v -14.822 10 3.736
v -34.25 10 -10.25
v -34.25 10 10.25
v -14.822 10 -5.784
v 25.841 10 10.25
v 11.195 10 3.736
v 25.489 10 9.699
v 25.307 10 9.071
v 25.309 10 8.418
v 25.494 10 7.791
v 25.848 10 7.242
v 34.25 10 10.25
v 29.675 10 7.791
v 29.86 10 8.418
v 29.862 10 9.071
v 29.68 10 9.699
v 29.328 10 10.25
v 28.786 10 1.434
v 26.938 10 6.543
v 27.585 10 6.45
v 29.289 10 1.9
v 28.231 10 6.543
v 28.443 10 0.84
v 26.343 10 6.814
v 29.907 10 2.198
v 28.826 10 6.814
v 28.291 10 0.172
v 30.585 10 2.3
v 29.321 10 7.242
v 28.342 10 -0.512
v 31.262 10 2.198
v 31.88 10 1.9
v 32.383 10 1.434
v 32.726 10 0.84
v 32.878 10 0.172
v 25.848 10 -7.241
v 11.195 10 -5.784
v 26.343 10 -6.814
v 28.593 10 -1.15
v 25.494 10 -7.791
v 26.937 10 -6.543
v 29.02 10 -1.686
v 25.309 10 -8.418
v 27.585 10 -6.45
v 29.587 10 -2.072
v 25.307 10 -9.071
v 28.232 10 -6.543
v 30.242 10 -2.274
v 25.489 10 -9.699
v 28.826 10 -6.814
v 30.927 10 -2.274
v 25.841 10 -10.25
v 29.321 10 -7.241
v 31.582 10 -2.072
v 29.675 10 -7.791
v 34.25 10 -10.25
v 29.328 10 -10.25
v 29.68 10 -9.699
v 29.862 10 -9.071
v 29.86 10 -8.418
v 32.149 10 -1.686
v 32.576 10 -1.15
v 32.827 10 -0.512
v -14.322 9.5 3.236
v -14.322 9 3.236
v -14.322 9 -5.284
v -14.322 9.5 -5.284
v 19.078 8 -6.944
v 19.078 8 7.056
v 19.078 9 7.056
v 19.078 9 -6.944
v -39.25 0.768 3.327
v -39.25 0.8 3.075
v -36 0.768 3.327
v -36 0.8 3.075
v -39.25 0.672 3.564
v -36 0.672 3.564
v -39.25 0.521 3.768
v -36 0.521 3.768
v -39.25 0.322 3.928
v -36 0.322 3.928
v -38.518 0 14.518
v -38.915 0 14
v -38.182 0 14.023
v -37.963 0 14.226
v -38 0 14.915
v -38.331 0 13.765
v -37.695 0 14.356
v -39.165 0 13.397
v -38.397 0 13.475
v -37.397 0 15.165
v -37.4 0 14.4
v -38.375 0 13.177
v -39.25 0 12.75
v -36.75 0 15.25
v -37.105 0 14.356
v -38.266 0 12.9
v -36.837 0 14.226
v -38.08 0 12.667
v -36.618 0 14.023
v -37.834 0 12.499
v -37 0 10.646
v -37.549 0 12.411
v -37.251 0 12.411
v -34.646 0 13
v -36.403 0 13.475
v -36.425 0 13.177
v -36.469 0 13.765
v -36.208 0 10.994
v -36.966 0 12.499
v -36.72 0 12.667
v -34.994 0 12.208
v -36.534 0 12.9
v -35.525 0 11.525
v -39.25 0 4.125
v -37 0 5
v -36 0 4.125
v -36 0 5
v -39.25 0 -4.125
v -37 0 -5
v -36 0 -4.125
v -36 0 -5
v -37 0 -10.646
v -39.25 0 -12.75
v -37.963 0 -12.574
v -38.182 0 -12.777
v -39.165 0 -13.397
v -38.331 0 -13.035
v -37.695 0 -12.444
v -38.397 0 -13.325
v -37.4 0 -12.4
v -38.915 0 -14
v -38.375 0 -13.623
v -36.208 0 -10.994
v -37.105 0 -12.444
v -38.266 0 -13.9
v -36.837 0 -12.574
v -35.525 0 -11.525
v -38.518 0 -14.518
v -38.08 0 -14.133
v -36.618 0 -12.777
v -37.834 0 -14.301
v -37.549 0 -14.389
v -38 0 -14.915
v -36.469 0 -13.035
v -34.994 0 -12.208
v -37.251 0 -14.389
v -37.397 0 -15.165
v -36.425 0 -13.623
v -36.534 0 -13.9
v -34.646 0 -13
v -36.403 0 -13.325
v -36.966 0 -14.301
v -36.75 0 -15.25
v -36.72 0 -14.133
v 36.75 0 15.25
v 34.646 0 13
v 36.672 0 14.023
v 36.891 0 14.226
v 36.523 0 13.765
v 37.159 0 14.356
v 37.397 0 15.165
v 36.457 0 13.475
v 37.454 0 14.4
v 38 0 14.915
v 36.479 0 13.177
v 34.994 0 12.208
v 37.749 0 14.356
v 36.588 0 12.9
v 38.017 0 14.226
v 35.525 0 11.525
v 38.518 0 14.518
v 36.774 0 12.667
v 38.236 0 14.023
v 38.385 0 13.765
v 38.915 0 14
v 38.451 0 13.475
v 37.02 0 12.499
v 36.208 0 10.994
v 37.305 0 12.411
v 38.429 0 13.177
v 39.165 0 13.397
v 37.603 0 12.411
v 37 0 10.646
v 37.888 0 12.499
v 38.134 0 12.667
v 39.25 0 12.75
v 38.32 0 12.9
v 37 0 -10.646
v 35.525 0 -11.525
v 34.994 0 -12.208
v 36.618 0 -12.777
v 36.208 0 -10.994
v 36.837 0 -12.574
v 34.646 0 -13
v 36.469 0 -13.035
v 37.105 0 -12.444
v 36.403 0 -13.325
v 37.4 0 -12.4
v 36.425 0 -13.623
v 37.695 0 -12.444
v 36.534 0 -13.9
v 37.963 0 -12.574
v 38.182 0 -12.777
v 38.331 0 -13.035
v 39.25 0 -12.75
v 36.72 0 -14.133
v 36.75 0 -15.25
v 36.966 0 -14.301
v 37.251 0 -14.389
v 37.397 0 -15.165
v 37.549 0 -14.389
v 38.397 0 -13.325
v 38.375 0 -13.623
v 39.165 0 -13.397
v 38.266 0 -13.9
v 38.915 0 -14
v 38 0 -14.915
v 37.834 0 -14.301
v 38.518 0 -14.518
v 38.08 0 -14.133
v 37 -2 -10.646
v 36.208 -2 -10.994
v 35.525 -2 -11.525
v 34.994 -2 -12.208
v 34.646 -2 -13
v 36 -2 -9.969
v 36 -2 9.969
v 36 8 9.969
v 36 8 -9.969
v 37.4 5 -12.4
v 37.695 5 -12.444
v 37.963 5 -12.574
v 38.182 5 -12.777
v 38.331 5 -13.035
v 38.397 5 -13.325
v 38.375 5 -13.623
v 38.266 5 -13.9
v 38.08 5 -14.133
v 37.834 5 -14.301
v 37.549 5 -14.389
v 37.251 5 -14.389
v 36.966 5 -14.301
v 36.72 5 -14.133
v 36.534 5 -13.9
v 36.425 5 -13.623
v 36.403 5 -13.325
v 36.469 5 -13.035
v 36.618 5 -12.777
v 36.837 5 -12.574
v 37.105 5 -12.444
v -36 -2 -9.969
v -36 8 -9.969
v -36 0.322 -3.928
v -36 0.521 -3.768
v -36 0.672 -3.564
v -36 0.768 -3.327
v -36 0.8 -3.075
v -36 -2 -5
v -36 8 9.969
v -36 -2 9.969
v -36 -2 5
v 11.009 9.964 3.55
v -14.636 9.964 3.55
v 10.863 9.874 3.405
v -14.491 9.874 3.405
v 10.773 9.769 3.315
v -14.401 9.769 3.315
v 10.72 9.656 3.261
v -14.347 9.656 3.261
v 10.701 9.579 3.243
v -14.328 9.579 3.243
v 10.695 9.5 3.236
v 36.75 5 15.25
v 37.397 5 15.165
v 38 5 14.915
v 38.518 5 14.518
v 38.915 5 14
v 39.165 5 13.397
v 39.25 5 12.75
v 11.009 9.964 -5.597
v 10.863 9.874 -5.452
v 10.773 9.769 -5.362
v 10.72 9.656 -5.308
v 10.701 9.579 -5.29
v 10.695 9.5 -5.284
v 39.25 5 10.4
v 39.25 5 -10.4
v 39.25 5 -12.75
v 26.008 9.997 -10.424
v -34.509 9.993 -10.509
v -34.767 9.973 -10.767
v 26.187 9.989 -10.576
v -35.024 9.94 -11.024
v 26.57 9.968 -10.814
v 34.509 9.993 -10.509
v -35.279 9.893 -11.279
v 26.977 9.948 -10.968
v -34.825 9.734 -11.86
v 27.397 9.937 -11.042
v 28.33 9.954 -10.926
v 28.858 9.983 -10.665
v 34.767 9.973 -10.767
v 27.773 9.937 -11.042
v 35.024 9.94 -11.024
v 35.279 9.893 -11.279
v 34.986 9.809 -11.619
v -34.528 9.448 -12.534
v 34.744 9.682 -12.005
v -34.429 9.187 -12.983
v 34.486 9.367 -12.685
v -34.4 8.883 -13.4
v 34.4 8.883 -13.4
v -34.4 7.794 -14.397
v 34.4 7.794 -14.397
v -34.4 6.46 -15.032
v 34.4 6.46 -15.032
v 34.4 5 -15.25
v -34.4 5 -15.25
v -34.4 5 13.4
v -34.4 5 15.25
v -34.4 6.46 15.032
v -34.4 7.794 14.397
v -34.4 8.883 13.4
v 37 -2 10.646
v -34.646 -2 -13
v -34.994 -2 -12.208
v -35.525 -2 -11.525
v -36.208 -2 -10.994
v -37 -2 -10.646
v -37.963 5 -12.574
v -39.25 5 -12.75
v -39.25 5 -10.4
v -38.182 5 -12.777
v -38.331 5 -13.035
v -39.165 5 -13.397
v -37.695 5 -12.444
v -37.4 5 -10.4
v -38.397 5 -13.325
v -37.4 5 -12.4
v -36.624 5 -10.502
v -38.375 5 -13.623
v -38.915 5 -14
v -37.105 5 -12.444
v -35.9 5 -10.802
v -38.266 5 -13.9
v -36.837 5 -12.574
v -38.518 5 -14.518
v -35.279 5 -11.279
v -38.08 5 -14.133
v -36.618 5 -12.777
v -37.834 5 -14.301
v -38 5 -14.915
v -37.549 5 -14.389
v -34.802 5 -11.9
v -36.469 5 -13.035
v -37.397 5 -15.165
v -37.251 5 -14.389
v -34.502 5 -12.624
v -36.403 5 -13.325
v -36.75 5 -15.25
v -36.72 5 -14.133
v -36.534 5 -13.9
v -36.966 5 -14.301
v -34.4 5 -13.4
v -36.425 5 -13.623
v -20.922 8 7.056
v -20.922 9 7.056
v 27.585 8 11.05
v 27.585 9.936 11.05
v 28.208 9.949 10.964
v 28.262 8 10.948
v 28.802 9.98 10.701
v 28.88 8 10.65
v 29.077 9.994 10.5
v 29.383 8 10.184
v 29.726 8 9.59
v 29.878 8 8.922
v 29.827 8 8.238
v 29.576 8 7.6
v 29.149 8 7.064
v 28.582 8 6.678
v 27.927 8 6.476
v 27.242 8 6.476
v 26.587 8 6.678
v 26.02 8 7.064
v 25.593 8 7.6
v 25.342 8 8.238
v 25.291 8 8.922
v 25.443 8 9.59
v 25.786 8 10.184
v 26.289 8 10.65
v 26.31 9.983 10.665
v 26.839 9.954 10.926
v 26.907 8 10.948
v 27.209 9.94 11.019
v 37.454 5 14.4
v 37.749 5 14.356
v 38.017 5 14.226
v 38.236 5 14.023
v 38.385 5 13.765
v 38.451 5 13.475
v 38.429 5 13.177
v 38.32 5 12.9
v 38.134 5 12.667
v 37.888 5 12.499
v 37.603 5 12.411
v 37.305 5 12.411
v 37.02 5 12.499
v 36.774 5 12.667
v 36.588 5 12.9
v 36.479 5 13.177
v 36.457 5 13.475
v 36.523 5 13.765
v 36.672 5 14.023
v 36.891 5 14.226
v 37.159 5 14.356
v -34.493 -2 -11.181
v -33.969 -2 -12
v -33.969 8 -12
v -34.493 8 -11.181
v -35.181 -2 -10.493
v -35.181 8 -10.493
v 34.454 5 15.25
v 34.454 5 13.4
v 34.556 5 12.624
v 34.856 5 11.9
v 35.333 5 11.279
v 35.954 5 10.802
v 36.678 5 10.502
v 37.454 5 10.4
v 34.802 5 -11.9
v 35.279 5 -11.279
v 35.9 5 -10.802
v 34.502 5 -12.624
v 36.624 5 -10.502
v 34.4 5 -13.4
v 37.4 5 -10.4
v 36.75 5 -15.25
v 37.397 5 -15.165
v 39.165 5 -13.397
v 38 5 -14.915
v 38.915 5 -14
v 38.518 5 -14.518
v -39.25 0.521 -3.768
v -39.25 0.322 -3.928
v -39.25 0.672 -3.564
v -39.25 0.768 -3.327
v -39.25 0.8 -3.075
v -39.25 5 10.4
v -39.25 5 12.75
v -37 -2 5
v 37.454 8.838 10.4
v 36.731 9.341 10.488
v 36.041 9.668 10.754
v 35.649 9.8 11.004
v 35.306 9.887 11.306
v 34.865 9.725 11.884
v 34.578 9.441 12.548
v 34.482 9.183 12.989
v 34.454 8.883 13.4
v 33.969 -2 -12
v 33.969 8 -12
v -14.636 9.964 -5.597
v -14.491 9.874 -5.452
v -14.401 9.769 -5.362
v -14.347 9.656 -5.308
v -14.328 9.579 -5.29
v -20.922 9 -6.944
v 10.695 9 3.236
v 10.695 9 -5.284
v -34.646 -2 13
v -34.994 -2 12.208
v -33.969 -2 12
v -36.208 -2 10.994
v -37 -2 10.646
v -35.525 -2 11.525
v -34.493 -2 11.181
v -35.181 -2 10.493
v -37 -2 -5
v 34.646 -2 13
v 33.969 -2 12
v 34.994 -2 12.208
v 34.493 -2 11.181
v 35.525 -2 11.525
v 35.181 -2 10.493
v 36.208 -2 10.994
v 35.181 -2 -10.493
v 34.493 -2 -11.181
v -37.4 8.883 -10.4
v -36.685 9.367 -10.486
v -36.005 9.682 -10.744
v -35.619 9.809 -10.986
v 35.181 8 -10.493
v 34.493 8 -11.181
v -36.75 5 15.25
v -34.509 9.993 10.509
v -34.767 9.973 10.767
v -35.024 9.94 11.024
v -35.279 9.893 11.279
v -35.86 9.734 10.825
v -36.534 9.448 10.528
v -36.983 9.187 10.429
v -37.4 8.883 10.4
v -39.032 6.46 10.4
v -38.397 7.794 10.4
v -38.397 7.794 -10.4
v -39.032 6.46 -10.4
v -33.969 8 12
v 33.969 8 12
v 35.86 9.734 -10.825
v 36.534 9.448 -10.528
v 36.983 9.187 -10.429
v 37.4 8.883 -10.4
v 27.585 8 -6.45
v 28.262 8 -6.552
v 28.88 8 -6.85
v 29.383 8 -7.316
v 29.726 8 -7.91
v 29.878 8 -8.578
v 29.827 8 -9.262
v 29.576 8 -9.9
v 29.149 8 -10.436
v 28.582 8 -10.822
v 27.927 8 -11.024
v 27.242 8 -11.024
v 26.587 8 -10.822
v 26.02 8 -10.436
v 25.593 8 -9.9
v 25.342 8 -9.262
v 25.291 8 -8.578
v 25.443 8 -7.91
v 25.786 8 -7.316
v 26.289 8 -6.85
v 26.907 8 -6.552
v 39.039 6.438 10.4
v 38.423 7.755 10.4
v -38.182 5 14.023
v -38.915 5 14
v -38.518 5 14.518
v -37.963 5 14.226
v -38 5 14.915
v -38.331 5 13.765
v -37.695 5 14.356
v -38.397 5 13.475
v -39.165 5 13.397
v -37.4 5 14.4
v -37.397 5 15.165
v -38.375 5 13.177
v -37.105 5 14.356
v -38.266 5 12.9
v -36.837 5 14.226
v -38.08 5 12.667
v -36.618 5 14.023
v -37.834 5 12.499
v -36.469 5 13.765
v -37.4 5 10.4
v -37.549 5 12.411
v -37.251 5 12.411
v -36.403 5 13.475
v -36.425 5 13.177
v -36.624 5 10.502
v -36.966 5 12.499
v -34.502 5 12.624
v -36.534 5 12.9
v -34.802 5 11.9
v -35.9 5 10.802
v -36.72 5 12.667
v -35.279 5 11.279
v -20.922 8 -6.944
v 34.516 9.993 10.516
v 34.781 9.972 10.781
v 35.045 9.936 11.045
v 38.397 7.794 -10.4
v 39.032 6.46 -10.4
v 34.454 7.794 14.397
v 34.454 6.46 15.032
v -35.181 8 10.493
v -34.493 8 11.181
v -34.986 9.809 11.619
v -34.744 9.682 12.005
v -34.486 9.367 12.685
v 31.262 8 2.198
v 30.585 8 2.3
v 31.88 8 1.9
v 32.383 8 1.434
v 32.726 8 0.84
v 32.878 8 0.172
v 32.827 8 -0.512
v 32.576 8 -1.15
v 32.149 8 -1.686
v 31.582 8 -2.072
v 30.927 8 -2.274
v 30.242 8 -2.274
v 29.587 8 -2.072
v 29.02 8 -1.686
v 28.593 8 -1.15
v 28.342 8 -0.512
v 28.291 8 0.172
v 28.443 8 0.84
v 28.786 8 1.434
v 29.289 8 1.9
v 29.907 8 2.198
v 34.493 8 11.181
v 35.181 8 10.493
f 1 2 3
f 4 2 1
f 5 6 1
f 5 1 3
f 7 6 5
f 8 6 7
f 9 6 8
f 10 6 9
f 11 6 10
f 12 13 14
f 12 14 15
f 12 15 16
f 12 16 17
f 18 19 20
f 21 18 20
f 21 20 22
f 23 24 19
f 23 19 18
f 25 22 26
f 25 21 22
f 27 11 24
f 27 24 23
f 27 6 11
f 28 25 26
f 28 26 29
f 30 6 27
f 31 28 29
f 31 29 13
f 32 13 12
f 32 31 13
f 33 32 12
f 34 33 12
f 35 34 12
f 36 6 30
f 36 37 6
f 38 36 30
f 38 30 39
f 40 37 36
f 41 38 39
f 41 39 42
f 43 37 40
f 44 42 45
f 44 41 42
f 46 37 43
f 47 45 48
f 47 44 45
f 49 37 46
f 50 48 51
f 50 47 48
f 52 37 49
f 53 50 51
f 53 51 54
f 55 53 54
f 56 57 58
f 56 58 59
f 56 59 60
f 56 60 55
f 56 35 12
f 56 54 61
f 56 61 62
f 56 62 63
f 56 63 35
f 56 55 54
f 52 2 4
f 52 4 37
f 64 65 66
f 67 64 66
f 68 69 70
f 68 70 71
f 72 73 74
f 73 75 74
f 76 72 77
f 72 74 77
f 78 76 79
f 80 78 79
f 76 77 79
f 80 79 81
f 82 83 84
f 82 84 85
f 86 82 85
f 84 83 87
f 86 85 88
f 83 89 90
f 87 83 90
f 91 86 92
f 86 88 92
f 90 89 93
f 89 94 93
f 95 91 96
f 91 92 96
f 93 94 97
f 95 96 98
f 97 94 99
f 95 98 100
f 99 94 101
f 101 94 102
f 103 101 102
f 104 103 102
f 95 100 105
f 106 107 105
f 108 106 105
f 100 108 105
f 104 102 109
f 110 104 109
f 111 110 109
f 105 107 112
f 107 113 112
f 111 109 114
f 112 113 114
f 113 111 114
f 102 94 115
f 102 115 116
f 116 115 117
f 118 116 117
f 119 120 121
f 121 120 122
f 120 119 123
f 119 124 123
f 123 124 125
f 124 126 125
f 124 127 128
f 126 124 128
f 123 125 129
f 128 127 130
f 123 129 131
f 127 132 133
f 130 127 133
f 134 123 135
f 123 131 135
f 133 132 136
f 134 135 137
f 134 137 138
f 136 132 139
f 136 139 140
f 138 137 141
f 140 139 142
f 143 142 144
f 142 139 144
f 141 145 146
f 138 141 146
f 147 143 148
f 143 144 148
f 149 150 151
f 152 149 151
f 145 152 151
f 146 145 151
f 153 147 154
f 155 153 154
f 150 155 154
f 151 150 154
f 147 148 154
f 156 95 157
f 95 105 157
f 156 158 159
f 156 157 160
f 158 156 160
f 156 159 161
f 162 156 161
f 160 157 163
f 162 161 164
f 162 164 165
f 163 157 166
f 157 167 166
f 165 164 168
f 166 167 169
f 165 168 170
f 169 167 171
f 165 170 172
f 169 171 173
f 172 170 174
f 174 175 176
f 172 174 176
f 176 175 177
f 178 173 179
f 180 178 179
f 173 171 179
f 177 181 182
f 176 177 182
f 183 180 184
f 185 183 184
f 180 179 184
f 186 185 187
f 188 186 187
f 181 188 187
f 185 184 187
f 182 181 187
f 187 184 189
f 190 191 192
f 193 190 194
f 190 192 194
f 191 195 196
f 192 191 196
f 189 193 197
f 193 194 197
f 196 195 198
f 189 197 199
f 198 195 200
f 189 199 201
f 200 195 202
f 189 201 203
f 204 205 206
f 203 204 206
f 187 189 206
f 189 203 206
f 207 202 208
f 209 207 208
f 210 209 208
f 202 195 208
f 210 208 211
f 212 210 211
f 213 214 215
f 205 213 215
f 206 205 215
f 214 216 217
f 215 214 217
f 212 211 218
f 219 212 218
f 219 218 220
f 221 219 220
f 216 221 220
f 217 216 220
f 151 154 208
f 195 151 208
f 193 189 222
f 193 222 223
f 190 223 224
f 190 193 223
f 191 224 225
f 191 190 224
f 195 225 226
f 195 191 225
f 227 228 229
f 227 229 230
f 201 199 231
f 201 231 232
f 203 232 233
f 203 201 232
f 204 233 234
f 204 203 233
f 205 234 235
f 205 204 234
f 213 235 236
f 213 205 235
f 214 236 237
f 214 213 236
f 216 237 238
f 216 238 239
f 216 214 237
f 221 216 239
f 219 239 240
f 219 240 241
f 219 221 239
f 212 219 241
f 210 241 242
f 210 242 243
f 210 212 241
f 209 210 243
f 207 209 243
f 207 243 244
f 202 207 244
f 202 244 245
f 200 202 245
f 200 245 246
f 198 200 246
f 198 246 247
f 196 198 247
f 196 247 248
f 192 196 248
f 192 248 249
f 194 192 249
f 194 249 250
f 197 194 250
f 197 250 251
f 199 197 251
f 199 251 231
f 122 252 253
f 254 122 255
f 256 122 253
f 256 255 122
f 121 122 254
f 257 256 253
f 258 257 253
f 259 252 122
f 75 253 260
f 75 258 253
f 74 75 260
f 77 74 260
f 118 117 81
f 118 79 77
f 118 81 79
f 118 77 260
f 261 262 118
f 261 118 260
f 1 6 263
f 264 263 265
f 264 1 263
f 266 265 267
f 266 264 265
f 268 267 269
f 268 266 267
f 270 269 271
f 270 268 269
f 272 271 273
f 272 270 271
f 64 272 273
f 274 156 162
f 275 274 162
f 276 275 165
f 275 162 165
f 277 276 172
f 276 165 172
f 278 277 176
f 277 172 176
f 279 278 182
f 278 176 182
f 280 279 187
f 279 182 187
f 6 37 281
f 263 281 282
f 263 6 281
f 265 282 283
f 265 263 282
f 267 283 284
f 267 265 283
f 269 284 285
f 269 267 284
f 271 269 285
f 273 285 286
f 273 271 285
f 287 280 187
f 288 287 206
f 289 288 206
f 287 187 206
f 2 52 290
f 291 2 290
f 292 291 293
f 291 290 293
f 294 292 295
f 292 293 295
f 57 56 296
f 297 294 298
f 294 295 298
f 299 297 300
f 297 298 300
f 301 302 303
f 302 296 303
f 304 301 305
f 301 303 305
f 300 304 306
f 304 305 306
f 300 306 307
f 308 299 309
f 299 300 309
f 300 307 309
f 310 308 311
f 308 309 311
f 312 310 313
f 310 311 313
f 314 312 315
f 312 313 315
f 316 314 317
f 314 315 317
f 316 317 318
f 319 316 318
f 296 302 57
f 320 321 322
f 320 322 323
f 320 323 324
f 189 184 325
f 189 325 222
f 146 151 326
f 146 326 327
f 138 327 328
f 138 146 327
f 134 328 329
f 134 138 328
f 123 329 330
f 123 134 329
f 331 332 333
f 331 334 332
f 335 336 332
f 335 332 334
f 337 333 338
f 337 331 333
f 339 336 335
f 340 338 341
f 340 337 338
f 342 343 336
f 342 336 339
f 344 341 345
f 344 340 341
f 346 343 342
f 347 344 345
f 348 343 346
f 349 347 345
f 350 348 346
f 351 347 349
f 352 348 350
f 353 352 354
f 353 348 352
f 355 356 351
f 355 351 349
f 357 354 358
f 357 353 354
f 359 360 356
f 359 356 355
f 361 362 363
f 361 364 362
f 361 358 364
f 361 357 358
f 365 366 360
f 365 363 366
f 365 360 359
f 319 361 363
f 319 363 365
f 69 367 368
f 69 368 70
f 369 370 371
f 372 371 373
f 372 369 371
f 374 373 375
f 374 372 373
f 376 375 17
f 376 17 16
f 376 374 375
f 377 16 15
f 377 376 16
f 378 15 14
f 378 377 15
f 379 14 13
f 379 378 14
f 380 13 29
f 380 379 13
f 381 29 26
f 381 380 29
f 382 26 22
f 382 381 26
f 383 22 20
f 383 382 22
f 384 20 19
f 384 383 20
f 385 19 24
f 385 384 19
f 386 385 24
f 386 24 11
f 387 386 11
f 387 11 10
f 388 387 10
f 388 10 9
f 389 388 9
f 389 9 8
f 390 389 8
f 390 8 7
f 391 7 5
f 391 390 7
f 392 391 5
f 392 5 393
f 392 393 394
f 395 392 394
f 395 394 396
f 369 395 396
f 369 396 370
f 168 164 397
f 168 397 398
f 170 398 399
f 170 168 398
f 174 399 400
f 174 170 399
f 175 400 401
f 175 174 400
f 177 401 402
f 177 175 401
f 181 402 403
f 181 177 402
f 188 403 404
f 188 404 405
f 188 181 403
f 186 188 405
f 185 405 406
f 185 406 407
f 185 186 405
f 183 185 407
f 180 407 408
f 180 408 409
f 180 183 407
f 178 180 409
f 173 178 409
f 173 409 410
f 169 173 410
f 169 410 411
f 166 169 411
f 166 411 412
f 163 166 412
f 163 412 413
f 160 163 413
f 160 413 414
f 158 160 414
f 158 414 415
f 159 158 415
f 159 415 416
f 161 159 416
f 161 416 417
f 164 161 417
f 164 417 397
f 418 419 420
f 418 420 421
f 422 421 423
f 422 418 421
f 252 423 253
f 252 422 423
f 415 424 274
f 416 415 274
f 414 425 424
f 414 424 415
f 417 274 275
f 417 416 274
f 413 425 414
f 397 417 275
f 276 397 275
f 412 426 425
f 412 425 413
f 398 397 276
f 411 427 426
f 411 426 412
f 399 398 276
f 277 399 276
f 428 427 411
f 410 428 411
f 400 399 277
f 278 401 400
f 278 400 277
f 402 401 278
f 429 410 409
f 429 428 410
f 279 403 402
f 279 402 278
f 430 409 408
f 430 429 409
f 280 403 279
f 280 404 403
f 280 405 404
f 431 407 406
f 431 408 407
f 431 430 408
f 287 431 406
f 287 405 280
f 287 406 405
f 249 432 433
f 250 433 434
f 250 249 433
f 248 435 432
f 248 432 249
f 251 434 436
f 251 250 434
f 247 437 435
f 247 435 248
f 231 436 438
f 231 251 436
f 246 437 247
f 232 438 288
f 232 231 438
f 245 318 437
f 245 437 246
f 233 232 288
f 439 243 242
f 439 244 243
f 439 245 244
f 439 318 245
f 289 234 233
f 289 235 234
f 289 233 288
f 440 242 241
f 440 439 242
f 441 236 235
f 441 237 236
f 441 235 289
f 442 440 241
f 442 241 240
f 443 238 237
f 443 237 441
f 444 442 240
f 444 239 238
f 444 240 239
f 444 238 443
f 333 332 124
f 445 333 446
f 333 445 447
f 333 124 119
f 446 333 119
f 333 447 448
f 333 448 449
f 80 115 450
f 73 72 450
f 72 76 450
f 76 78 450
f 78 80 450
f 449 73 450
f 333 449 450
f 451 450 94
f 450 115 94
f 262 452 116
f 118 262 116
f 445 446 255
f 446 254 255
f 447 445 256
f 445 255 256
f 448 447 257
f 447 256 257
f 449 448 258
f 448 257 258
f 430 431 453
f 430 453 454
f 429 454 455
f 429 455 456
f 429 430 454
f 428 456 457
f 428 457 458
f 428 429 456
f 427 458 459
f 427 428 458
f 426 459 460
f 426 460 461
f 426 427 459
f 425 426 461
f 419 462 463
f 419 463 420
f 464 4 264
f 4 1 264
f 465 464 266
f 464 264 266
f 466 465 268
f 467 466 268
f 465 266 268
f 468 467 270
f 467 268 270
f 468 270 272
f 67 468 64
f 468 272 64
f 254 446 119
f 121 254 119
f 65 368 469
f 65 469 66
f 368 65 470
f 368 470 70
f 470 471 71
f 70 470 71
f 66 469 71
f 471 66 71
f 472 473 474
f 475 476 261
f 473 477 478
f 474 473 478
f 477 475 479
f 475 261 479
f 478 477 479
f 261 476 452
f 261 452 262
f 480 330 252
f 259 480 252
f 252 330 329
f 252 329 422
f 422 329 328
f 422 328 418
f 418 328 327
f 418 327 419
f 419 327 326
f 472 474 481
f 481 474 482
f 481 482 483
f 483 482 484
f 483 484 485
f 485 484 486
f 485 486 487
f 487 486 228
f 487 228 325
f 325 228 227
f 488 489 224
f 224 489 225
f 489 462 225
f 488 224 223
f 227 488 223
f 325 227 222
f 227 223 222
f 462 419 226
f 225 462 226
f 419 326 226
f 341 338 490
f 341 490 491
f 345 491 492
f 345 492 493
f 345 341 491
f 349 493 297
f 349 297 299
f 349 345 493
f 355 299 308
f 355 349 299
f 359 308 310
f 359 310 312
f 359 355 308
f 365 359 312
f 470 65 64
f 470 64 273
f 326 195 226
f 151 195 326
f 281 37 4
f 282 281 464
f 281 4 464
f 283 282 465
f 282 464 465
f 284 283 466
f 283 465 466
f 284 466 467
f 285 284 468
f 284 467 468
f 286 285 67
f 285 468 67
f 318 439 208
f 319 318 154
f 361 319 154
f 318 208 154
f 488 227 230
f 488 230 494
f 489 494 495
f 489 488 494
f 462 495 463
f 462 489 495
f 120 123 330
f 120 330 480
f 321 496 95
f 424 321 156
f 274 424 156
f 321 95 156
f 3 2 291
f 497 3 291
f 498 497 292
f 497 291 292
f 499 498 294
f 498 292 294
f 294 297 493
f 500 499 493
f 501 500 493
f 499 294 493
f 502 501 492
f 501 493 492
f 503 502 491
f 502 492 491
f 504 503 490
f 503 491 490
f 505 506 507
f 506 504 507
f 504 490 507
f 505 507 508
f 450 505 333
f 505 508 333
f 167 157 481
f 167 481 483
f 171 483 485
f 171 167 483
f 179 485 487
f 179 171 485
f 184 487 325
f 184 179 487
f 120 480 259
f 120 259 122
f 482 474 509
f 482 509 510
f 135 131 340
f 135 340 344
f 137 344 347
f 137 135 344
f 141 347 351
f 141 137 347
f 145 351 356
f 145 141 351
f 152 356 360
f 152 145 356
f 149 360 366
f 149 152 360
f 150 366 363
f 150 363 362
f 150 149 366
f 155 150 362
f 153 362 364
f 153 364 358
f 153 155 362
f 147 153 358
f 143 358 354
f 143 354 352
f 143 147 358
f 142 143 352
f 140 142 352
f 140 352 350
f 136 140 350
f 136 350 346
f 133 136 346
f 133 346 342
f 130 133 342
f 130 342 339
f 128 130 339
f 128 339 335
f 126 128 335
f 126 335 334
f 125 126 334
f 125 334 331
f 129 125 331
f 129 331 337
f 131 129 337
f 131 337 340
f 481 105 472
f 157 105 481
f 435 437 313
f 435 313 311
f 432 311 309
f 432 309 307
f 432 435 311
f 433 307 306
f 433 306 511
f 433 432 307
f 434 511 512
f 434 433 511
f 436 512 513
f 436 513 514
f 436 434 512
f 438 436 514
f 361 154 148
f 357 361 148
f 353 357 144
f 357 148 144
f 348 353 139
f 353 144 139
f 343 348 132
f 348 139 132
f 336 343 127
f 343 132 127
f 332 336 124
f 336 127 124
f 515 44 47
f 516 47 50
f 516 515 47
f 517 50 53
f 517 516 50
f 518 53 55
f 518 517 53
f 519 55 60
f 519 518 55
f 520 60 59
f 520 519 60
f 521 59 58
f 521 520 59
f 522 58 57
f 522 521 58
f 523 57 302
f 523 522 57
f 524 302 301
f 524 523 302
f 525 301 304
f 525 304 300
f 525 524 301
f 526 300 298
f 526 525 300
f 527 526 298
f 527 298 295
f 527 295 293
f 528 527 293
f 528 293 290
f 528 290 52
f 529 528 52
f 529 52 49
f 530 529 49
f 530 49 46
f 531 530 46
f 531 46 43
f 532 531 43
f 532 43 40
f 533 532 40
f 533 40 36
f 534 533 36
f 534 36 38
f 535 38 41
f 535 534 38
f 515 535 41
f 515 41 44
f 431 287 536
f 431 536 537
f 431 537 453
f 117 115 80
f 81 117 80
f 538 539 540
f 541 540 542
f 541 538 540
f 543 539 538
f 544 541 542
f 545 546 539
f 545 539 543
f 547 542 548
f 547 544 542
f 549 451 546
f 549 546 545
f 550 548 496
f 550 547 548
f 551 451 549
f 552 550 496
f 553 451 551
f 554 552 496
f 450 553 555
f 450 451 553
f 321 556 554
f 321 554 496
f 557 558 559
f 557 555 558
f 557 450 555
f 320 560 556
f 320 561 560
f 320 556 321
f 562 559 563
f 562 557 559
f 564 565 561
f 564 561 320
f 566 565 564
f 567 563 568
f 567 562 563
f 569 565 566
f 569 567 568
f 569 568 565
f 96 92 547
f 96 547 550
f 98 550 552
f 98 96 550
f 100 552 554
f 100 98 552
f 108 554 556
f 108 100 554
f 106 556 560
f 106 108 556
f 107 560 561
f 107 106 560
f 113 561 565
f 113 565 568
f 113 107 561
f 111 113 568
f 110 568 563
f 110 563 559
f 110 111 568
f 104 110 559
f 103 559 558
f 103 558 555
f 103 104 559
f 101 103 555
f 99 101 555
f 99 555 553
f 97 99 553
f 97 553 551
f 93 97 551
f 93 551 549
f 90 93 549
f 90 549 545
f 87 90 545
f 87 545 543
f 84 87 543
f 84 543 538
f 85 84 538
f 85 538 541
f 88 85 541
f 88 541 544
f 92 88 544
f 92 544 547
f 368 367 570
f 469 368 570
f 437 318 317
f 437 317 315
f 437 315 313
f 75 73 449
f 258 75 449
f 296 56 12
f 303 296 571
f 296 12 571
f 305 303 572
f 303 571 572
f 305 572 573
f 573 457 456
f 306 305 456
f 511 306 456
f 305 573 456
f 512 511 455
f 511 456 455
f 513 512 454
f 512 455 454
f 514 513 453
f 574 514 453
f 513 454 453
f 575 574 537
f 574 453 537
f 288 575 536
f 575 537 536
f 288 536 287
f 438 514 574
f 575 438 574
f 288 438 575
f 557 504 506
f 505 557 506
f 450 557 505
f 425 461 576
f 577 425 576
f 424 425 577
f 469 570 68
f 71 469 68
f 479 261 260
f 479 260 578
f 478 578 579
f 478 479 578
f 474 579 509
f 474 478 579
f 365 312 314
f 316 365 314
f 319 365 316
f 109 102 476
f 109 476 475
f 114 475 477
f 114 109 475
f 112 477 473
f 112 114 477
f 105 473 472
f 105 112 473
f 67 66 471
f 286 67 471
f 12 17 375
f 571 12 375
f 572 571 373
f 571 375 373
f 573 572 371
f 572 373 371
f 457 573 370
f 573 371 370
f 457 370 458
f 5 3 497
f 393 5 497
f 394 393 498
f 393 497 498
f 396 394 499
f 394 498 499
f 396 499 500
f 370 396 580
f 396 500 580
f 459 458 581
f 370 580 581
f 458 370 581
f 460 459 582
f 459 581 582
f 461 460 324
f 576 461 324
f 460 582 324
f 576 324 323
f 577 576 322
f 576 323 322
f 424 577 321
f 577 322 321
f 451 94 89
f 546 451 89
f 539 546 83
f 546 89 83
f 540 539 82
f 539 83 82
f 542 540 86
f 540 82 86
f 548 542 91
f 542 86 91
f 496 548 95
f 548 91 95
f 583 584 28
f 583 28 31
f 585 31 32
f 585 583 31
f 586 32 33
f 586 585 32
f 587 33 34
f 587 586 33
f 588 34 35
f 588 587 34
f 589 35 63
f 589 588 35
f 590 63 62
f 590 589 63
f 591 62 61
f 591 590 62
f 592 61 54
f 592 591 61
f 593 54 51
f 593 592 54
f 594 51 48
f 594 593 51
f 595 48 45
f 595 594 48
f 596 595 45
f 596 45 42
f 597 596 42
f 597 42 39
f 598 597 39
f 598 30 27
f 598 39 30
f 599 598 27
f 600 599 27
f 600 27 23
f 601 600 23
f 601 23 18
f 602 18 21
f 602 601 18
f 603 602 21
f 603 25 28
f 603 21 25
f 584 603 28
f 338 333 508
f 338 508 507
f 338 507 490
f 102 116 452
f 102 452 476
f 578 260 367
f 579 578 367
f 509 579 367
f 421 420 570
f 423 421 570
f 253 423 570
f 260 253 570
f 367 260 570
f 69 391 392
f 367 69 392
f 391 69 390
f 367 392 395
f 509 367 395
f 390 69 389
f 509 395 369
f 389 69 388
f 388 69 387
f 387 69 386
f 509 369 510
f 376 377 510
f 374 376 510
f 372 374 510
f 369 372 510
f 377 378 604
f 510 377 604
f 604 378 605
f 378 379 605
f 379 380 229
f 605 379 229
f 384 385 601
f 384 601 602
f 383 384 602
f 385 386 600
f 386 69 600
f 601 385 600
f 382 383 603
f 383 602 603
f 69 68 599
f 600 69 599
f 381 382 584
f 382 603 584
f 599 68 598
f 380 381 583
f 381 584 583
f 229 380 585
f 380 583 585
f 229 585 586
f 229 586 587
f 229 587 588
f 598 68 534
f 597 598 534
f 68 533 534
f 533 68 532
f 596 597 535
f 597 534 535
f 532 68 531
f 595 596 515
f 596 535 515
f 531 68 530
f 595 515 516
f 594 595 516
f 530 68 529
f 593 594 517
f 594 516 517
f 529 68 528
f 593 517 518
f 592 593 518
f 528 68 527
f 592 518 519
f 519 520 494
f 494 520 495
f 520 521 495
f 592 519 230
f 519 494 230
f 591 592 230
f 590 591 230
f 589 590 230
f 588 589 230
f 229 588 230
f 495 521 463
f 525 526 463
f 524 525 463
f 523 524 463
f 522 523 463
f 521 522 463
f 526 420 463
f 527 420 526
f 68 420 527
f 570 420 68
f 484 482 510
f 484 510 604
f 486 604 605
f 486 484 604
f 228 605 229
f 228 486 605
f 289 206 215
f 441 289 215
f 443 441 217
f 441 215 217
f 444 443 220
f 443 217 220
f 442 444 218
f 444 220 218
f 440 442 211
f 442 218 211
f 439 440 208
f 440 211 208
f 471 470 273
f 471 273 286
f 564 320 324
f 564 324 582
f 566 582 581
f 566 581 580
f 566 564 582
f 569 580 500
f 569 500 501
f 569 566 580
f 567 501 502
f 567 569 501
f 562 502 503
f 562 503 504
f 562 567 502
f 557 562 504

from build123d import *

# Parameters (mm, degrees)
EXTRUDE_1276_DEPTH          = 10
CUT_EXTRUDE_1340_DEPTH      = 8
EXTRUDE_1406_DEPTH          = 2
CUT_EXTRUDE_1479_DEPTH      = 2
CUT_EXTRUDE_1479_DEPTH_BACK = 2
CUT_EXTRUDE_1550_DEPTH      = 44.279614139
CUT_EXTRUDE_1550_DEPTH_BACK = 44.279614139
SKETCH_1_7_R                = 1
USB_REACH                   = 80.4
USB_2_W                     = 10
USB_2_H                     = 2
CUT_EXTRUDE_START           = -5
SKETCH_3_R                  = 1
CUT_EXTRUDE_3145_DEPTH      = 5
FILLET_3202_R               = 5
CUT_EXTRUDE_3663_DEPTH      = 44.279614288
CUT_EXTRUDE_3663_DEPTH_BACK = 44.279614288
SKETCH_8_W                  = 25.017119527
SKETCH_8_H                  = 8.52
SKETCH_11_W                 = 40
SKETCH_11_H                 = 14
CUT_EXTRUDE_3720_DEPTH      = 9
FILLET_3777_R               = 0.5
CUT_EXTRUDE_12_REACH        = 82.59
USB_4_R                     = 1
CUT_EXTRUDE_4523_DEPTH      = 44.279614288
CUT_EXTRUDE_4523_DEPTH_BACK = 44.279614288
SKETCH_13_R                 = 2.3


with BuildPart() as part:
    # Sketch 378 → Extrude 1276 (new body)
    with BuildSketch(Plane(origin=(0, 0, 0), x_dir=(1, 0, 0), z_dir=(0, 1, 0))):
        with BuildLine():
            Line((-39.25, 12.75), (-39.25, -12.75))
            ThreePointArc((-39.25, -12.75), (-38.517766953, -14.517766953), (-36.75, -15.25))
            Line((-36.75, -15.25), (36.75, -15.25))
            ThreePointArc((36.75, -15.25), (38.517766953, -14.517766953), (39.25, -12.75))
            Line((39.25, -12.75), (39.25, 12.75))
            ThreePointArc((39.25, 12.75), (38.517766953, 14.517766953), (36.75, 15.25))
            Line((36.75, 15.25), (-36.75, 15.25))
            ThreePointArc((-36.75, 15.25), (-38.517766953, 14.517766953), (-39.25, 12.75))
        make_face()
    extrude(amount=EXTRUDE_1276_DEPTH)

    # Эскиз1<3> → Cut-Extrude 1340 (cut)
    with BuildSketch(Plane(origin=(0, 0, 0), x_dir=(1, 0, 0), z_dir=(0, 1, 0))):
        with BuildLine():
            Line((33.968871126, 12), (-33.968871126, 12))
            ThreePointArc((-33.968871126, 12), (-34.818019485, 10.818019485), (-36, 9.968871126))
            Line((-36, 9.968871126), (-36, -9.968871126))
            ThreePointArc((-36, -9.968871126), (-34.818019485, -10.818019485), (-33.968871126, -12))
            Line((-33.968871126, -12), (33.968871126, -12))
            ThreePointArc((33.968871126, -12), (34.818019485, -10.818019485), (36, -9.968871126))
            Line((36, -9.968871126), (36, 9.968871126))
            ThreePointArc((36, 9.968871126), (34.818019485, 10.818019485), (33.968871126, 12))
        make_face()
    extrude(amount=CUT_EXTRUDE_1340_DEPTH, mode=Mode.SUBTRACT)

    # Эскиз1<4> → Extrude 1406 (add)
    with BuildSketch(Plane(origin=(0, 0, 0), x_dir=(1, 0, 0), z_dir=(0, 1, 0))):
        with BuildLine():
            Line((34.645898034, 13), (-34.645898034, 13))
            ThreePointArc((-34.645898034, 13), (-35.525126266, 11.525126266), (-37, 10.645898034))
            Line((-37, 10.645898034), (-37, -10.645898034))
            ThreePointArc((-37, -10.645898034), (-35.525126266, -11.525126266), (-34.645898034, -13))
            Line((-34.645898034, -13), (34.645898034, -13))
            ThreePointArc((34.645898034, -13), (35.525126266, -11.525126266), (37, -10.645898034))
            Line((37, -10.645898034), (37, 10.645898034))
            ThreePointArc((37, 10.645898034), (35.525126266, 11.525126266), (34.645898034, 13))
        make_face()
    extrude(amount=-EXTRUDE_1406_DEPTH)

    # Эскиз1<6> → Cut-Extrude 1479 (cut, two sides: drawn at the far end of the back side and taken through both)
    with BuildSketch(Plane(origin=(0, 0, 0), x_dir=(1, 0, 0), z_dir=(0, 1, 0)).offset(-CUT_EXTRUDE_1479_DEPTH_BACK)):
        with BuildLine():
            Line((33.968871126, 12), (-33.968871126, 12))
            ThreePointArc((-33.968871126, 12), (-34.818019485, 10.818019485), (-36, 9.968871126))
            Line((-36, 9.968871126), (-36, -9.968871126))
            ThreePointArc((-36, -9.968871126), (-34.818019485, -10.818019485), (-33.968871126, -12))
            Line((-33.968871126, -12), (33.968871126, -12))
            ThreePointArc((33.968871126, -12), (34.818019485, -10.818019485), (36, -9.968871126))
            Line((36, -9.968871126), (36, 9.968871126))
            ThreePointArc((36, 9.968871126), (34.818019485, 10.818019485), (33.968871126, 12))
        make_face()
    extrude(amount=CUT_EXTRUDE_1479_DEPTH + CUT_EXTRUDE_1479_DEPTH_BACK, mode=Mode.SUBTRACT)

    # Эскиз1<7> → Cut-Extrude 1550 (cut, two sides: drawn at the far end of the back side and taken through both)
    with BuildSketch(Plane(origin=(0, 0, 0), x_dir=(1, 0, 0), z_dir=(0, 1, 0)).offset(-CUT_EXTRUDE_1550_DEPTH_BACK)):
        with Locations(Location((37.454174909, -13.4, 0), (0, 0, 270))):
            Circle(SKETCH_1_7_R)
        with Locations(Location((-37.4, 13.4, 0), (0, 0, 270))):
            Circle(SKETCH_1_7_R)
        with Locations(Location((37.4, 13.4, 0), (0, 0, 270))):
            Circle(SKETCH_1_7_R)
        with Locations(Location((-37.4, -13.4, 0), (0, 0, 270))):
            Circle(SKETCH_1_7_R)
    extrude(amount=CUT_EXTRUDE_1550_DEPTH + CUT_EXTRUDE_1550_DEPTH_BACK, mode=Mode.SUBTRACT)

    # USB 2 → USB (cut, up to next)
    with BuildSketch(Plane.ZY.offset(37), mode=Mode.PRIVATE) as usb_sk1:
        with Locations((0, -1)):
            Rectangle(USB_2_W, USB_2_H)
    usb_tool1 = extrude(usb_sk1.sketch, amount=-USB_REACH, mode=Mode.PRIVATE) & part.part
    add(usb_tool1.solids().sort_by_distance((-37, -1, 0))[0], mode=Mode.SUBTRACT)

    # Эскиз3 → Cut-Extrude 3145 (cut)
    # profile 1 of 4: a face of its own
    with BuildSketch(Plane(origin=(0, 10, 0), x_dir=(1, 0, 0), z_dir=(0, 1, 0)).offset(CUT_EXTRUDE_START)):
        with BuildLine():
            Line((-34.4, 13.4), (-34.4, 15.25))
            Line((-34.4, 15.25), (-36.75, 15.25))
            ThreePointArc((-36.75, 15.25), (-38.517766953, 14.517766953), (-39.25, 12.75))
            Line((-39.25, 12.75), (-39.25, 10.4))
            Line((-39.25, 10.4), (-37.4, 10.4))
            ThreePointArc((-37.4, 10.4), (-35.278679656, 11.278679656), (-34.4, 13.4))
        make_face()
        with Locations(Location((-37.4, 13.4, 0), (0, 0, 270))):
            Circle(SKETCH_3_R, mode=Mode.SUBTRACT)
    # profile 2 of 4: a face of its own
    with BuildSketch(Plane(origin=(0, 10, 0), x_dir=(1, 0, 0), z_dir=(0, 1, 0)).offset(CUT_EXTRUDE_START)):
        with BuildLine():
            Line((-36.75, -15.25), (-34.4, -15.25))
            Line((-34.4, -15.25), (-34.4, -13.4))
            ThreePointArc((-34.4, -13.4), (-35.278679656, -11.278679656), (-37.4, -10.4))
            Line((-37.4, -10.4), (-39.25, -10.4))
            Line((-39.25, -10.4), (-39.25, -12.75))
            ThreePointArc((-39.25, -12.75), (-38.517766953, -14.517766953), (-36.75, -15.25))
        make_face()
        with Locations(Location((-37.4, -13.4, 0), (0, 0, 270))):
            Circle(SKETCH_3_R, mode=Mode.SUBTRACT)
    # profile 3 of 4: a face of its own
    with BuildSketch(Plane(origin=(0, 10, 0), x_dir=(1, 0, 0), z_dir=(0, 1, 0)).offset(CUT_EXTRUDE_START)):
        with BuildLine():
            ThreePointArc((36.75, -15.25), (38.517766953, -14.517766953), (39.25, -12.75))
            Line((39.25, -12.75), (39.25, -10.4))
            Line((39.25, -10.4), (37.454174909, -10.4))
            ThreePointArc((37.454174909, -10.4), (35.332854565, -11.278679656), (34.454174909, -13.4))
            Line((34.454174909, -13.4), (34.454174909, -15.25))
            Line((34.454174909, -15.25), (36.75, -15.25))
        make_face()
        with Locations(Location((37.454174909, -13.4, 0), (0, 0, 270))):
            Circle(SKETCH_3_R, mode=Mode.SUBTRACT)
    # profile 4 of 4: a face of its own
    with BuildSketch(Plane(origin=(0, 10, 0), x_dir=(1, 0, 0), z_dir=(0, 1, 0)).offset(CUT_EXTRUDE_START)):
        with BuildLine():
            Line((37.4, 10.4), (39.25, 10.4))
            Line((39.25, 10.4), (39.25, 12.75))
            ThreePointArc((39.25, 12.75), (38.517766953, 14.517766953), (36.75, 15.25))
            Line((36.75, 15.25), (34.4, 15.25))
            Line((34.4, 15.25), (34.4, 13.4))
            ThreePointArc((34.4, 13.4), (35.278679656, 11.278679656), (37.4, 10.4))
        make_face()
        with Locations(Location((37.4, 13.4, 0), (0, 0, 270))):
            Circle(SKETCH_3_R, mode=Mode.SUBTRACT)
    extrude(amount=CUT_EXTRUDE_3145_DEPTH, mode=Mode.SUBTRACT)

    # Fillet 3202
    # the kernel refuses this fillet: 5 mm, written as the material it takes off along each edge
    with BuildSketch(Plane(origin=(-39.25, 10, -22.9), x_dir=(0, -1, 0), z_dir=(0, 0, 1)), Plane(origin=(39.25, 10, 22.9), x_dir=(0, -1, 0), z_dir=(0, 0, -1))) as fillet_3202_piece_1:
        with BuildLine():
            CenterArc((FILLET_3202_R, FILLET_3202_R), FILLET_3202_R, 180, 90)
            Line((0, FILLET_3202_R), (0, 0))
            Line((0, 0), (FILLET_3202_R, 0))
        make_face()
    extrude(amount=45.8, mode=Mode.SUBTRACT)
    with BuildSketch(Plane(origin=(46.9, 10, -15.25), x_dir=(0, -1, 0), z_dir=(-1, 0, 0))) as fillet_3202_piece_2:
        with BuildLine():
            CenterArc((FILLET_3202_R, FILLET_3202_R), FILLET_3202_R, 180, 90)
            Line((0, FILLET_3202_R), (0, 0))
            Line((0, 0), (FILLET_3202_R, 0))
        make_face()
    extrude(amount=93.8, mode=Mode.SUBTRACT)
    with BuildSketch(Plane(origin=(-46.9, 10, 15.25), x_dir=(0, -1, 0), z_dir=(1, 0, 0))) as fillet_3202_piece_3:
        with BuildLine():
            CenterArc((FILLET_3202_R, FILLET_3202_R), FILLET_3202_R, 180, 90)
            Line((0, FILLET_3202_R), (0, 0))
            Line((0, 0), (FILLET_3202_R, 0))
        make_face()
    extrude(amount=93.854174909, mode=Mode.SUBTRACT)

    # основной эскиз<8> → Cut-Extrude 3663 (cut, two sides: drawn at the far end of the back side and taken through both)
    with BuildSketch(Plane(origin=(0, 0, 0), x_dir=(1, 0, 0), z_dir=(0, 1, 0)).offset(-CUT_EXTRUDE_3663_DEPTH_BACK)):
        with Locations((-1.813623337, 1.023507904)):
            Rectangle(SKETCH_8_W, SKETCH_8_H)
    extrude(amount=CUT_EXTRUDE_3663_DEPTH + CUT_EXTRUDE_3663_DEPTH_BACK, mode=Mode.SUBTRACT)

    # основной эскиз<11> → Cut-Extrude 3720 (cut)
    with BuildSketch(Plane(origin=(0, 0, 0), x_dir=(1, 0, 0), z_dir=(0, 1, 0))):
        with Locations((-0.9221831, -0.056492096)):
            Rectangle(SKETCH_11_W, SKETCH_11_H)
    extrude(amount=CUT_EXTRUDE_3720_DEPTH, mode=Mode.SUBTRACT)

    # Fillet 3777
    fillet_3777_edges = [part.edges().sort_by_distance(p)[0] for p in [
        (10.694936427, 10, -1.023507904),
        (-1.813623336, 10, -5.283507904),
        (-14.3221831, 10, -1.023507904),
        (-1.813623336, 10, 3.236492096),
    ]]
    fillet(fillet_3777_edges, radius=FILLET_3777_R)

    # USB 3 → Вырез-Вытянуть12 (cut, up to next)
    with BuildSketch(Plane.ZY.offset(39.25), mode=Mode.PRIVATE) as cut_extrude_12_sk1:
        Polygon((-4.125, -0.7), (4.125, -0.7), (4.125, 0), (3.635102051, 0.8), (-3.635102051, 0.8), (-4.125, 0), align=None)
    cut_extrude_12_tool1 = extrude(cut_extrude_12_sk1.sketch, amount=-CUT_EXTRUDE_12_REACH, mode=Mode.PRIVATE) & part.part
    add(cut_extrude_12_tool1.solids().sort_by_distance((-39.25, 0.034192, 0))[0], mode=Mode.SUBTRACT)

    # USB 4
    usb_4_edges = [part.edges().sort_by_distance(p)[0] for p in [
        (-37.625, 0.8, 3.635102051),
        (-37.625, 0.8, -3.635102051),
    ]]
    fillet(usb_4_edges, radius=USB_4_R)

    # основной эскиз<13> → Cut-Extrude 4523 (cut, two sides: drawn at the far end of the back side and taken through both)
    with BuildSketch(Plane(origin=(0, 0, 0), x_dir=(1, 0, 0), z_dir=(0, 1, 0)).offset(-CUT_EXTRUDE_4523_DEPTH_BACK)):
        with Locations(Location((27.584507944, 8.749878541, 0), (0, 0, 270))):
            Circle(SKETCH_13_R)
        with Locations(Location((30.584507944, -0.000121459, 0), (0, 0, 270))):
            Circle(SKETCH_13_R)
        with Locations(Location((27.584507944, -8.750117644, 0), (0, 0, 270))):
            Circle(SKETCH_13_R)
    extrude(amount=CUT_EXTRUDE_4523_DEPTH + CUT_EXTRUDE_4523_DEPTH_BACK, mode=Mode.SUBTRACT)


solid = part.part
